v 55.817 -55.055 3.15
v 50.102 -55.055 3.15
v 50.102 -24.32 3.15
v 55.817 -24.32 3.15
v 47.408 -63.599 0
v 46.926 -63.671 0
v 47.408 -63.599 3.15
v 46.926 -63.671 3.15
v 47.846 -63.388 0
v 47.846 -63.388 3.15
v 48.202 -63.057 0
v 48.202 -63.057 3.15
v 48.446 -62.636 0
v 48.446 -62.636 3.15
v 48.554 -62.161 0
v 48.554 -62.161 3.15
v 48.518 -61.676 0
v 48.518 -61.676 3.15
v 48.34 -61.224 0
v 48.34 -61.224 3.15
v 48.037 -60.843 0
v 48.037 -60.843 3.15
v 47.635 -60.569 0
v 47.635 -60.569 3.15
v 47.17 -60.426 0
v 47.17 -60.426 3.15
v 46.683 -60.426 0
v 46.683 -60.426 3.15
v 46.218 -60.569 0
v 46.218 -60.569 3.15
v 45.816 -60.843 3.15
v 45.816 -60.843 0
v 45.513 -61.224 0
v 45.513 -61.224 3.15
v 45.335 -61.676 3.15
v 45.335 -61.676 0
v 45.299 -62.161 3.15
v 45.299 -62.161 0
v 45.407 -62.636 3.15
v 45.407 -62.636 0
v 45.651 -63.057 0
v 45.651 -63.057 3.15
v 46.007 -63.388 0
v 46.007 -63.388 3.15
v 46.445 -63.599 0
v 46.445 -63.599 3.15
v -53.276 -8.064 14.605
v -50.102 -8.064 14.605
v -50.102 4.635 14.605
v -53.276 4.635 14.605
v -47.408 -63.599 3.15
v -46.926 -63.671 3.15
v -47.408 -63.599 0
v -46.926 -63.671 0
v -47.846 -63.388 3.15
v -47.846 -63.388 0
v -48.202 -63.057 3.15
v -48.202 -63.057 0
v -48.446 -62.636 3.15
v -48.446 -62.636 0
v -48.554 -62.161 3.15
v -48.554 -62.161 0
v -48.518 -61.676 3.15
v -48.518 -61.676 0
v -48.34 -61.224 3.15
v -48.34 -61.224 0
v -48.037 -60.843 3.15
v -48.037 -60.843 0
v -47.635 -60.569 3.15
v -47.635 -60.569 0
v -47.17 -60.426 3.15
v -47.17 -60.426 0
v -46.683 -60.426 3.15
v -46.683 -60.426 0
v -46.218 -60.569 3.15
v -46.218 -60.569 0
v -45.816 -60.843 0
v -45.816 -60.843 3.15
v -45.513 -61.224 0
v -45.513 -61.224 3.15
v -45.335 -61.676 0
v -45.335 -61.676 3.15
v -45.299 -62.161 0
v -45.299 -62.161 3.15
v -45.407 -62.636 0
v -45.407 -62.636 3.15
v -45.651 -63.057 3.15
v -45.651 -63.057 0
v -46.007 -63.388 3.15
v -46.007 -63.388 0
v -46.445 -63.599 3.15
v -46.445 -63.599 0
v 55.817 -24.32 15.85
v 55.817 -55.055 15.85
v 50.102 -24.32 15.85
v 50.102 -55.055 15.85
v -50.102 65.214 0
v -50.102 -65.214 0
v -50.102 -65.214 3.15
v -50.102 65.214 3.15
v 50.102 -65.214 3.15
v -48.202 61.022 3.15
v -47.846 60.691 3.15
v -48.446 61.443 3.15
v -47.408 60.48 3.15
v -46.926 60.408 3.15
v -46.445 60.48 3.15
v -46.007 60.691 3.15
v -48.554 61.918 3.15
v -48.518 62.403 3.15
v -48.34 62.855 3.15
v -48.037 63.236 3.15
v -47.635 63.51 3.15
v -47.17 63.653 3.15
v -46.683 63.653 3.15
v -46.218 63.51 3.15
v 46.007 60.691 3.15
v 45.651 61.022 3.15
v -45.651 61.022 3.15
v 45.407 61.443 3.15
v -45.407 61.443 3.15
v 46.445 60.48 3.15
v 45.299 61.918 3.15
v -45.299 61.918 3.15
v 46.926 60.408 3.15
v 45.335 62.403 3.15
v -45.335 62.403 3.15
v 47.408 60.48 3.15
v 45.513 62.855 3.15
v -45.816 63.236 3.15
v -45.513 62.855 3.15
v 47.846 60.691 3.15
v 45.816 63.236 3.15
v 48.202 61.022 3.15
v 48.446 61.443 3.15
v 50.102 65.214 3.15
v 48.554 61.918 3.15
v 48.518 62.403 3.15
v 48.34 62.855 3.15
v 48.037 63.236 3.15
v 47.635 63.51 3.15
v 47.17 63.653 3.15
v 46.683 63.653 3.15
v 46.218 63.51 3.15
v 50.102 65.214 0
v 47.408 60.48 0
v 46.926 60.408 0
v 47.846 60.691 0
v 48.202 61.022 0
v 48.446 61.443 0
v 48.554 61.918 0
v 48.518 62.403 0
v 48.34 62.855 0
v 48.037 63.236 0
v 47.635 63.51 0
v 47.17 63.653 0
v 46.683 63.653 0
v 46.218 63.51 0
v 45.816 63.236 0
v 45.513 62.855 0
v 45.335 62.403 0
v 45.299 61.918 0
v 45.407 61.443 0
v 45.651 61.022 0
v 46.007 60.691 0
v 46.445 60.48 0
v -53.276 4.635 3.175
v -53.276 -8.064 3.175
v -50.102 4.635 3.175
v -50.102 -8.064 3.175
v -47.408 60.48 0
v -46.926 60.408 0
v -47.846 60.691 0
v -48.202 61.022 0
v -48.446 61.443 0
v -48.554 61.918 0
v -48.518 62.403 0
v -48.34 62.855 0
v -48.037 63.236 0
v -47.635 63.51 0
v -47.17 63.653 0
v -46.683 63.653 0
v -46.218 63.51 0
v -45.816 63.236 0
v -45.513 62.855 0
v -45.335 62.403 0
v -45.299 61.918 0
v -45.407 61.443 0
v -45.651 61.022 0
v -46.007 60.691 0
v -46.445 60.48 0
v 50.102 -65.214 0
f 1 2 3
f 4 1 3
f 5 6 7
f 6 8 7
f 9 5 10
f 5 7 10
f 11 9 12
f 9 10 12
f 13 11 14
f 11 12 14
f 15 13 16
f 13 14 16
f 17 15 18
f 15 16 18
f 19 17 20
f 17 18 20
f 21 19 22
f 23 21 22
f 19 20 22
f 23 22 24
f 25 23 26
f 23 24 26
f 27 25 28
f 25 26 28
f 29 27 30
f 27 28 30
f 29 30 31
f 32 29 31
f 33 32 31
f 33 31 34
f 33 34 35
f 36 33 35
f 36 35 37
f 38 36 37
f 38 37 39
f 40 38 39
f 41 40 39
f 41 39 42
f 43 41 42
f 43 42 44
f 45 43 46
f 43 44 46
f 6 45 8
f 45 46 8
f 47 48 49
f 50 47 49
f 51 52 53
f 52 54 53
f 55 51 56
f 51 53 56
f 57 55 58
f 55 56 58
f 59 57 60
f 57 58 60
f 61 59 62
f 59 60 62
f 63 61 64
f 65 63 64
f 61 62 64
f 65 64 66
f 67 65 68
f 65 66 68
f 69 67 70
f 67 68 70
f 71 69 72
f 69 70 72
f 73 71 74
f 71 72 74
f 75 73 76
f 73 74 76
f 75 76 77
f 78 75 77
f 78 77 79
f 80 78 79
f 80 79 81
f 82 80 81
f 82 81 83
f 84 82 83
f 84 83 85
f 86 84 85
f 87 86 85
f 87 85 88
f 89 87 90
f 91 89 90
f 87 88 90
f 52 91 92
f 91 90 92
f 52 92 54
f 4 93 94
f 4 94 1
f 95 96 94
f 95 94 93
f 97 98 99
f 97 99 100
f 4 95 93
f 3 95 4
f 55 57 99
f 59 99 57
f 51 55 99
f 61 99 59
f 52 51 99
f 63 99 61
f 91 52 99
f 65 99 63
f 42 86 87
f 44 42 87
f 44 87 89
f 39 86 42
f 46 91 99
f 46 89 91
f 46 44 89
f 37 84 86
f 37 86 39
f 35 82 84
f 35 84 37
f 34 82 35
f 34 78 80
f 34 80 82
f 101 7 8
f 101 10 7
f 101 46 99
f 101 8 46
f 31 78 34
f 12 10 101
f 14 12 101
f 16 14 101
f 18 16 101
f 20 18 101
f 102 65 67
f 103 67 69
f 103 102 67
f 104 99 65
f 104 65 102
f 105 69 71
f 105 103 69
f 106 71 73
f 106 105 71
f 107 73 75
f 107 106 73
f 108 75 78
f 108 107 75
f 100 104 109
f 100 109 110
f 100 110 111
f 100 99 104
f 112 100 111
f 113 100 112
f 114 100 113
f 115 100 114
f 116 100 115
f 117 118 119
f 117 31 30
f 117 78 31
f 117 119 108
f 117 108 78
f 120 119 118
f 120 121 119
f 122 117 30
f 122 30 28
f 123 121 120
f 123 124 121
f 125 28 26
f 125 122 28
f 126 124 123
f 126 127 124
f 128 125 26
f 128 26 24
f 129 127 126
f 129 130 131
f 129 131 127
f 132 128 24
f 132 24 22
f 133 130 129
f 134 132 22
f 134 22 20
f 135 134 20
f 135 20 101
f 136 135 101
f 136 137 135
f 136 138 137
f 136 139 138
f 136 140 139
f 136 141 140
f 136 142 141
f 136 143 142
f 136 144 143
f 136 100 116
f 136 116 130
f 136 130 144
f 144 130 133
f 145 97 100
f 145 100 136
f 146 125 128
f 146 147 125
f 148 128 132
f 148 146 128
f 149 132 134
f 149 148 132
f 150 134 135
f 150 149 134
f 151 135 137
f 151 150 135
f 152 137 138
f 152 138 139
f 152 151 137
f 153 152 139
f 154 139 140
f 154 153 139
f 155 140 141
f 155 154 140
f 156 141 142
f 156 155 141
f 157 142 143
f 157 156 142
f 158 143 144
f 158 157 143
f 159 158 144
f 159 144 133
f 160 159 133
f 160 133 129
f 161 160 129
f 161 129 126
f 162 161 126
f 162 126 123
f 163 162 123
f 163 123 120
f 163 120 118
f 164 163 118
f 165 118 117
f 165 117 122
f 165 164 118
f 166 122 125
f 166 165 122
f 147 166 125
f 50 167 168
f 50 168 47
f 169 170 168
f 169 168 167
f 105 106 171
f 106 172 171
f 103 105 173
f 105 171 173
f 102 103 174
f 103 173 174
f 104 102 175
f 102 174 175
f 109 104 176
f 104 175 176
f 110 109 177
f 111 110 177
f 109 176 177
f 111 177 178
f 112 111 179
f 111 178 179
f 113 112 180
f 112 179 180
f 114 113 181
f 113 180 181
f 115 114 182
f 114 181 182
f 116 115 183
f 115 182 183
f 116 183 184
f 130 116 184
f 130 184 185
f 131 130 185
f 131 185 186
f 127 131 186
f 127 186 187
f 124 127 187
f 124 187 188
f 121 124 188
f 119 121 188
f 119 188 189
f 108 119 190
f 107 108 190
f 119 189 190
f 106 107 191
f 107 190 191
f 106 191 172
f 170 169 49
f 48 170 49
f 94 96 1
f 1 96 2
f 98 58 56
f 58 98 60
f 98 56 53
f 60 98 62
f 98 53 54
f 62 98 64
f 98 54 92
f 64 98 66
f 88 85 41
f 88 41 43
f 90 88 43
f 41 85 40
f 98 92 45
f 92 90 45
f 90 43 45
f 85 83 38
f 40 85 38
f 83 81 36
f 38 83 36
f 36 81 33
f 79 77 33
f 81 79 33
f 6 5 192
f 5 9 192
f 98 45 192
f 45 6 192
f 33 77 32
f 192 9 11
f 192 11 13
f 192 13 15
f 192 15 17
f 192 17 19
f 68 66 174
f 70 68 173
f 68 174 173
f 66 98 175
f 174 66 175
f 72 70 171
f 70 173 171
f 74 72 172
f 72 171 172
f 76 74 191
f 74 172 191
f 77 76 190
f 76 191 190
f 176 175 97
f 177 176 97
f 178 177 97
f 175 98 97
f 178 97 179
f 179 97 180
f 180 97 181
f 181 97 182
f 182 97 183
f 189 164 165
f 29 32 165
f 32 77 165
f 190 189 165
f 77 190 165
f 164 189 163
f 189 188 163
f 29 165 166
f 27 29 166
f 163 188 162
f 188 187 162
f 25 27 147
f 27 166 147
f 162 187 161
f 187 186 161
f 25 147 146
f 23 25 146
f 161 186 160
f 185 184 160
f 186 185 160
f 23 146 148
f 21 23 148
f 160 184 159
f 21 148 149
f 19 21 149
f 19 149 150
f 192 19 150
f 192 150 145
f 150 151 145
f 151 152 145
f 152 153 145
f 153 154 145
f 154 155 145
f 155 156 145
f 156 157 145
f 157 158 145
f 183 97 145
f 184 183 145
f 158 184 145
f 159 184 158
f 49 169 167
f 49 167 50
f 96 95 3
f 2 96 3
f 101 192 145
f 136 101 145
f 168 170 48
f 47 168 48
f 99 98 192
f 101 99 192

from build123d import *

# Parameters (mm, degrees)
SKETCH1_W                      = 100.203
SKETCH1_H                      = 130.429
EXTRUDE1_DEPTH                 = 3.1496
SKETCH3_W                      = 11.43
SKETCH3_H                      = 12.7
EXTRUDE3_DEPTH                 = 3.175
SKETCH6_W                      = 12.7
SKETCH6_H                      = 30.734
EXTRUDE4_DEPTH                 = 5.715
SKETCH5_W                      = 1.63195
SKETCH5_H                      = 3.1496
F_4_CLEARANCE_HOLE1_AT_2_COUNT = 2
F_4_CLEARANCE_HOLE1_AT_2_PITCH = 124.079
MIRROR1_COPY_1_SKETCH_W        = 1.63195
MIRROR1_COPY_1_SKETCH_H        = 3.1496


with BuildPart() as part:
    # Sketch1 → Extrude1 (new body)
    with BuildSketch(Plane.XY):
        Rectangle(SKETCH1_W, SKETCH1_H)
    extrude(amount=EXTRUDE1_DEPTH)

    # Sketch5 → #4 Clearance Hole1 (revolve, cut)
    with BuildSketch(Plane(origin=(-46.9265, 62.0395, 3.1496), x_dir=(0, -1, 0), z_dir=(1, 0, 0))):
        with Locations((0.815975, 1.5748)):
            Rectangle(SKETCH5_W, SKETCH5_H)
    f_4_clearance_hole1 = revolve(axis=Axis((-46.9265, 62.0395, 9.4996), (0, 0, -1)), mode=Mode.SUBTRACT)

    # #4 Clearance Hole1 at 2: #4 Clearance Hole1 ×2
    with Locations(*[(0, -i * F_4_CLEARANCE_HOLE1_AT_2_PITCH, 0) for i in range(1, F_4_CLEARANCE_HOLE1_AT_2_COUNT)]):
        add(f_4_clearance_hole1, mode=Mode.SUBTRACT)

    # Mirror1: #4 Clearance Hole1 across plane
    add(f_4_clearance_hole1.mirror(Plane(origin=(0, 0, 0), x_dir=(0, 0, 1), z_dir=(1, 0, 0))), mode=Mode.SUBTRACT)

    # Mirror1 copy 1 sketch → Mirror1 copy 1 (revolve, cut)
    with BuildSketch(Plane(origin=(46.9265, -62.0395, 3.1496), x_dir=(0, -1, 0), z_dir=(-1, 0, 0))):
        with Locations((0.815975, -1.5748)):
            Rectangle(MIRROR1_COPY_1_SKETCH_W, MIRROR1_COPY_1_SKETCH_H)
    revolve(axis=Axis((46.9265, -62.0395, 9.4996), (0, 0, 1)), mode=Mode.SUBTRACT)


with BuildPart() as body_2:
    # Sketch3 → Extrude3 (new body)
    with BuildSketch(Plane.ZY.offset(50.1015)):
        with Locations((8.89, -1.7145)):
            Rectangle(SKETCH3_W, SKETCH3_H)
    extrude(amount=EXTRUDE3_DEPTH)


with BuildPart() as body_3:
    # Sketch6 → Extrude4 (new body)
    with BuildSketch(Plane(origin=(50.1015, 0, 0), x_dir=(0, 0, -1), z_dir=(1, 0, 0))):
        with Locations((-9.4996, -39.6875)):
            Rectangle(SKETCH6_W, SKETCH6_H)
    extrude(amount=EXTRUDE4_DEPTH)


solid = Compound([part.part, body_2.part, body_3.part])
